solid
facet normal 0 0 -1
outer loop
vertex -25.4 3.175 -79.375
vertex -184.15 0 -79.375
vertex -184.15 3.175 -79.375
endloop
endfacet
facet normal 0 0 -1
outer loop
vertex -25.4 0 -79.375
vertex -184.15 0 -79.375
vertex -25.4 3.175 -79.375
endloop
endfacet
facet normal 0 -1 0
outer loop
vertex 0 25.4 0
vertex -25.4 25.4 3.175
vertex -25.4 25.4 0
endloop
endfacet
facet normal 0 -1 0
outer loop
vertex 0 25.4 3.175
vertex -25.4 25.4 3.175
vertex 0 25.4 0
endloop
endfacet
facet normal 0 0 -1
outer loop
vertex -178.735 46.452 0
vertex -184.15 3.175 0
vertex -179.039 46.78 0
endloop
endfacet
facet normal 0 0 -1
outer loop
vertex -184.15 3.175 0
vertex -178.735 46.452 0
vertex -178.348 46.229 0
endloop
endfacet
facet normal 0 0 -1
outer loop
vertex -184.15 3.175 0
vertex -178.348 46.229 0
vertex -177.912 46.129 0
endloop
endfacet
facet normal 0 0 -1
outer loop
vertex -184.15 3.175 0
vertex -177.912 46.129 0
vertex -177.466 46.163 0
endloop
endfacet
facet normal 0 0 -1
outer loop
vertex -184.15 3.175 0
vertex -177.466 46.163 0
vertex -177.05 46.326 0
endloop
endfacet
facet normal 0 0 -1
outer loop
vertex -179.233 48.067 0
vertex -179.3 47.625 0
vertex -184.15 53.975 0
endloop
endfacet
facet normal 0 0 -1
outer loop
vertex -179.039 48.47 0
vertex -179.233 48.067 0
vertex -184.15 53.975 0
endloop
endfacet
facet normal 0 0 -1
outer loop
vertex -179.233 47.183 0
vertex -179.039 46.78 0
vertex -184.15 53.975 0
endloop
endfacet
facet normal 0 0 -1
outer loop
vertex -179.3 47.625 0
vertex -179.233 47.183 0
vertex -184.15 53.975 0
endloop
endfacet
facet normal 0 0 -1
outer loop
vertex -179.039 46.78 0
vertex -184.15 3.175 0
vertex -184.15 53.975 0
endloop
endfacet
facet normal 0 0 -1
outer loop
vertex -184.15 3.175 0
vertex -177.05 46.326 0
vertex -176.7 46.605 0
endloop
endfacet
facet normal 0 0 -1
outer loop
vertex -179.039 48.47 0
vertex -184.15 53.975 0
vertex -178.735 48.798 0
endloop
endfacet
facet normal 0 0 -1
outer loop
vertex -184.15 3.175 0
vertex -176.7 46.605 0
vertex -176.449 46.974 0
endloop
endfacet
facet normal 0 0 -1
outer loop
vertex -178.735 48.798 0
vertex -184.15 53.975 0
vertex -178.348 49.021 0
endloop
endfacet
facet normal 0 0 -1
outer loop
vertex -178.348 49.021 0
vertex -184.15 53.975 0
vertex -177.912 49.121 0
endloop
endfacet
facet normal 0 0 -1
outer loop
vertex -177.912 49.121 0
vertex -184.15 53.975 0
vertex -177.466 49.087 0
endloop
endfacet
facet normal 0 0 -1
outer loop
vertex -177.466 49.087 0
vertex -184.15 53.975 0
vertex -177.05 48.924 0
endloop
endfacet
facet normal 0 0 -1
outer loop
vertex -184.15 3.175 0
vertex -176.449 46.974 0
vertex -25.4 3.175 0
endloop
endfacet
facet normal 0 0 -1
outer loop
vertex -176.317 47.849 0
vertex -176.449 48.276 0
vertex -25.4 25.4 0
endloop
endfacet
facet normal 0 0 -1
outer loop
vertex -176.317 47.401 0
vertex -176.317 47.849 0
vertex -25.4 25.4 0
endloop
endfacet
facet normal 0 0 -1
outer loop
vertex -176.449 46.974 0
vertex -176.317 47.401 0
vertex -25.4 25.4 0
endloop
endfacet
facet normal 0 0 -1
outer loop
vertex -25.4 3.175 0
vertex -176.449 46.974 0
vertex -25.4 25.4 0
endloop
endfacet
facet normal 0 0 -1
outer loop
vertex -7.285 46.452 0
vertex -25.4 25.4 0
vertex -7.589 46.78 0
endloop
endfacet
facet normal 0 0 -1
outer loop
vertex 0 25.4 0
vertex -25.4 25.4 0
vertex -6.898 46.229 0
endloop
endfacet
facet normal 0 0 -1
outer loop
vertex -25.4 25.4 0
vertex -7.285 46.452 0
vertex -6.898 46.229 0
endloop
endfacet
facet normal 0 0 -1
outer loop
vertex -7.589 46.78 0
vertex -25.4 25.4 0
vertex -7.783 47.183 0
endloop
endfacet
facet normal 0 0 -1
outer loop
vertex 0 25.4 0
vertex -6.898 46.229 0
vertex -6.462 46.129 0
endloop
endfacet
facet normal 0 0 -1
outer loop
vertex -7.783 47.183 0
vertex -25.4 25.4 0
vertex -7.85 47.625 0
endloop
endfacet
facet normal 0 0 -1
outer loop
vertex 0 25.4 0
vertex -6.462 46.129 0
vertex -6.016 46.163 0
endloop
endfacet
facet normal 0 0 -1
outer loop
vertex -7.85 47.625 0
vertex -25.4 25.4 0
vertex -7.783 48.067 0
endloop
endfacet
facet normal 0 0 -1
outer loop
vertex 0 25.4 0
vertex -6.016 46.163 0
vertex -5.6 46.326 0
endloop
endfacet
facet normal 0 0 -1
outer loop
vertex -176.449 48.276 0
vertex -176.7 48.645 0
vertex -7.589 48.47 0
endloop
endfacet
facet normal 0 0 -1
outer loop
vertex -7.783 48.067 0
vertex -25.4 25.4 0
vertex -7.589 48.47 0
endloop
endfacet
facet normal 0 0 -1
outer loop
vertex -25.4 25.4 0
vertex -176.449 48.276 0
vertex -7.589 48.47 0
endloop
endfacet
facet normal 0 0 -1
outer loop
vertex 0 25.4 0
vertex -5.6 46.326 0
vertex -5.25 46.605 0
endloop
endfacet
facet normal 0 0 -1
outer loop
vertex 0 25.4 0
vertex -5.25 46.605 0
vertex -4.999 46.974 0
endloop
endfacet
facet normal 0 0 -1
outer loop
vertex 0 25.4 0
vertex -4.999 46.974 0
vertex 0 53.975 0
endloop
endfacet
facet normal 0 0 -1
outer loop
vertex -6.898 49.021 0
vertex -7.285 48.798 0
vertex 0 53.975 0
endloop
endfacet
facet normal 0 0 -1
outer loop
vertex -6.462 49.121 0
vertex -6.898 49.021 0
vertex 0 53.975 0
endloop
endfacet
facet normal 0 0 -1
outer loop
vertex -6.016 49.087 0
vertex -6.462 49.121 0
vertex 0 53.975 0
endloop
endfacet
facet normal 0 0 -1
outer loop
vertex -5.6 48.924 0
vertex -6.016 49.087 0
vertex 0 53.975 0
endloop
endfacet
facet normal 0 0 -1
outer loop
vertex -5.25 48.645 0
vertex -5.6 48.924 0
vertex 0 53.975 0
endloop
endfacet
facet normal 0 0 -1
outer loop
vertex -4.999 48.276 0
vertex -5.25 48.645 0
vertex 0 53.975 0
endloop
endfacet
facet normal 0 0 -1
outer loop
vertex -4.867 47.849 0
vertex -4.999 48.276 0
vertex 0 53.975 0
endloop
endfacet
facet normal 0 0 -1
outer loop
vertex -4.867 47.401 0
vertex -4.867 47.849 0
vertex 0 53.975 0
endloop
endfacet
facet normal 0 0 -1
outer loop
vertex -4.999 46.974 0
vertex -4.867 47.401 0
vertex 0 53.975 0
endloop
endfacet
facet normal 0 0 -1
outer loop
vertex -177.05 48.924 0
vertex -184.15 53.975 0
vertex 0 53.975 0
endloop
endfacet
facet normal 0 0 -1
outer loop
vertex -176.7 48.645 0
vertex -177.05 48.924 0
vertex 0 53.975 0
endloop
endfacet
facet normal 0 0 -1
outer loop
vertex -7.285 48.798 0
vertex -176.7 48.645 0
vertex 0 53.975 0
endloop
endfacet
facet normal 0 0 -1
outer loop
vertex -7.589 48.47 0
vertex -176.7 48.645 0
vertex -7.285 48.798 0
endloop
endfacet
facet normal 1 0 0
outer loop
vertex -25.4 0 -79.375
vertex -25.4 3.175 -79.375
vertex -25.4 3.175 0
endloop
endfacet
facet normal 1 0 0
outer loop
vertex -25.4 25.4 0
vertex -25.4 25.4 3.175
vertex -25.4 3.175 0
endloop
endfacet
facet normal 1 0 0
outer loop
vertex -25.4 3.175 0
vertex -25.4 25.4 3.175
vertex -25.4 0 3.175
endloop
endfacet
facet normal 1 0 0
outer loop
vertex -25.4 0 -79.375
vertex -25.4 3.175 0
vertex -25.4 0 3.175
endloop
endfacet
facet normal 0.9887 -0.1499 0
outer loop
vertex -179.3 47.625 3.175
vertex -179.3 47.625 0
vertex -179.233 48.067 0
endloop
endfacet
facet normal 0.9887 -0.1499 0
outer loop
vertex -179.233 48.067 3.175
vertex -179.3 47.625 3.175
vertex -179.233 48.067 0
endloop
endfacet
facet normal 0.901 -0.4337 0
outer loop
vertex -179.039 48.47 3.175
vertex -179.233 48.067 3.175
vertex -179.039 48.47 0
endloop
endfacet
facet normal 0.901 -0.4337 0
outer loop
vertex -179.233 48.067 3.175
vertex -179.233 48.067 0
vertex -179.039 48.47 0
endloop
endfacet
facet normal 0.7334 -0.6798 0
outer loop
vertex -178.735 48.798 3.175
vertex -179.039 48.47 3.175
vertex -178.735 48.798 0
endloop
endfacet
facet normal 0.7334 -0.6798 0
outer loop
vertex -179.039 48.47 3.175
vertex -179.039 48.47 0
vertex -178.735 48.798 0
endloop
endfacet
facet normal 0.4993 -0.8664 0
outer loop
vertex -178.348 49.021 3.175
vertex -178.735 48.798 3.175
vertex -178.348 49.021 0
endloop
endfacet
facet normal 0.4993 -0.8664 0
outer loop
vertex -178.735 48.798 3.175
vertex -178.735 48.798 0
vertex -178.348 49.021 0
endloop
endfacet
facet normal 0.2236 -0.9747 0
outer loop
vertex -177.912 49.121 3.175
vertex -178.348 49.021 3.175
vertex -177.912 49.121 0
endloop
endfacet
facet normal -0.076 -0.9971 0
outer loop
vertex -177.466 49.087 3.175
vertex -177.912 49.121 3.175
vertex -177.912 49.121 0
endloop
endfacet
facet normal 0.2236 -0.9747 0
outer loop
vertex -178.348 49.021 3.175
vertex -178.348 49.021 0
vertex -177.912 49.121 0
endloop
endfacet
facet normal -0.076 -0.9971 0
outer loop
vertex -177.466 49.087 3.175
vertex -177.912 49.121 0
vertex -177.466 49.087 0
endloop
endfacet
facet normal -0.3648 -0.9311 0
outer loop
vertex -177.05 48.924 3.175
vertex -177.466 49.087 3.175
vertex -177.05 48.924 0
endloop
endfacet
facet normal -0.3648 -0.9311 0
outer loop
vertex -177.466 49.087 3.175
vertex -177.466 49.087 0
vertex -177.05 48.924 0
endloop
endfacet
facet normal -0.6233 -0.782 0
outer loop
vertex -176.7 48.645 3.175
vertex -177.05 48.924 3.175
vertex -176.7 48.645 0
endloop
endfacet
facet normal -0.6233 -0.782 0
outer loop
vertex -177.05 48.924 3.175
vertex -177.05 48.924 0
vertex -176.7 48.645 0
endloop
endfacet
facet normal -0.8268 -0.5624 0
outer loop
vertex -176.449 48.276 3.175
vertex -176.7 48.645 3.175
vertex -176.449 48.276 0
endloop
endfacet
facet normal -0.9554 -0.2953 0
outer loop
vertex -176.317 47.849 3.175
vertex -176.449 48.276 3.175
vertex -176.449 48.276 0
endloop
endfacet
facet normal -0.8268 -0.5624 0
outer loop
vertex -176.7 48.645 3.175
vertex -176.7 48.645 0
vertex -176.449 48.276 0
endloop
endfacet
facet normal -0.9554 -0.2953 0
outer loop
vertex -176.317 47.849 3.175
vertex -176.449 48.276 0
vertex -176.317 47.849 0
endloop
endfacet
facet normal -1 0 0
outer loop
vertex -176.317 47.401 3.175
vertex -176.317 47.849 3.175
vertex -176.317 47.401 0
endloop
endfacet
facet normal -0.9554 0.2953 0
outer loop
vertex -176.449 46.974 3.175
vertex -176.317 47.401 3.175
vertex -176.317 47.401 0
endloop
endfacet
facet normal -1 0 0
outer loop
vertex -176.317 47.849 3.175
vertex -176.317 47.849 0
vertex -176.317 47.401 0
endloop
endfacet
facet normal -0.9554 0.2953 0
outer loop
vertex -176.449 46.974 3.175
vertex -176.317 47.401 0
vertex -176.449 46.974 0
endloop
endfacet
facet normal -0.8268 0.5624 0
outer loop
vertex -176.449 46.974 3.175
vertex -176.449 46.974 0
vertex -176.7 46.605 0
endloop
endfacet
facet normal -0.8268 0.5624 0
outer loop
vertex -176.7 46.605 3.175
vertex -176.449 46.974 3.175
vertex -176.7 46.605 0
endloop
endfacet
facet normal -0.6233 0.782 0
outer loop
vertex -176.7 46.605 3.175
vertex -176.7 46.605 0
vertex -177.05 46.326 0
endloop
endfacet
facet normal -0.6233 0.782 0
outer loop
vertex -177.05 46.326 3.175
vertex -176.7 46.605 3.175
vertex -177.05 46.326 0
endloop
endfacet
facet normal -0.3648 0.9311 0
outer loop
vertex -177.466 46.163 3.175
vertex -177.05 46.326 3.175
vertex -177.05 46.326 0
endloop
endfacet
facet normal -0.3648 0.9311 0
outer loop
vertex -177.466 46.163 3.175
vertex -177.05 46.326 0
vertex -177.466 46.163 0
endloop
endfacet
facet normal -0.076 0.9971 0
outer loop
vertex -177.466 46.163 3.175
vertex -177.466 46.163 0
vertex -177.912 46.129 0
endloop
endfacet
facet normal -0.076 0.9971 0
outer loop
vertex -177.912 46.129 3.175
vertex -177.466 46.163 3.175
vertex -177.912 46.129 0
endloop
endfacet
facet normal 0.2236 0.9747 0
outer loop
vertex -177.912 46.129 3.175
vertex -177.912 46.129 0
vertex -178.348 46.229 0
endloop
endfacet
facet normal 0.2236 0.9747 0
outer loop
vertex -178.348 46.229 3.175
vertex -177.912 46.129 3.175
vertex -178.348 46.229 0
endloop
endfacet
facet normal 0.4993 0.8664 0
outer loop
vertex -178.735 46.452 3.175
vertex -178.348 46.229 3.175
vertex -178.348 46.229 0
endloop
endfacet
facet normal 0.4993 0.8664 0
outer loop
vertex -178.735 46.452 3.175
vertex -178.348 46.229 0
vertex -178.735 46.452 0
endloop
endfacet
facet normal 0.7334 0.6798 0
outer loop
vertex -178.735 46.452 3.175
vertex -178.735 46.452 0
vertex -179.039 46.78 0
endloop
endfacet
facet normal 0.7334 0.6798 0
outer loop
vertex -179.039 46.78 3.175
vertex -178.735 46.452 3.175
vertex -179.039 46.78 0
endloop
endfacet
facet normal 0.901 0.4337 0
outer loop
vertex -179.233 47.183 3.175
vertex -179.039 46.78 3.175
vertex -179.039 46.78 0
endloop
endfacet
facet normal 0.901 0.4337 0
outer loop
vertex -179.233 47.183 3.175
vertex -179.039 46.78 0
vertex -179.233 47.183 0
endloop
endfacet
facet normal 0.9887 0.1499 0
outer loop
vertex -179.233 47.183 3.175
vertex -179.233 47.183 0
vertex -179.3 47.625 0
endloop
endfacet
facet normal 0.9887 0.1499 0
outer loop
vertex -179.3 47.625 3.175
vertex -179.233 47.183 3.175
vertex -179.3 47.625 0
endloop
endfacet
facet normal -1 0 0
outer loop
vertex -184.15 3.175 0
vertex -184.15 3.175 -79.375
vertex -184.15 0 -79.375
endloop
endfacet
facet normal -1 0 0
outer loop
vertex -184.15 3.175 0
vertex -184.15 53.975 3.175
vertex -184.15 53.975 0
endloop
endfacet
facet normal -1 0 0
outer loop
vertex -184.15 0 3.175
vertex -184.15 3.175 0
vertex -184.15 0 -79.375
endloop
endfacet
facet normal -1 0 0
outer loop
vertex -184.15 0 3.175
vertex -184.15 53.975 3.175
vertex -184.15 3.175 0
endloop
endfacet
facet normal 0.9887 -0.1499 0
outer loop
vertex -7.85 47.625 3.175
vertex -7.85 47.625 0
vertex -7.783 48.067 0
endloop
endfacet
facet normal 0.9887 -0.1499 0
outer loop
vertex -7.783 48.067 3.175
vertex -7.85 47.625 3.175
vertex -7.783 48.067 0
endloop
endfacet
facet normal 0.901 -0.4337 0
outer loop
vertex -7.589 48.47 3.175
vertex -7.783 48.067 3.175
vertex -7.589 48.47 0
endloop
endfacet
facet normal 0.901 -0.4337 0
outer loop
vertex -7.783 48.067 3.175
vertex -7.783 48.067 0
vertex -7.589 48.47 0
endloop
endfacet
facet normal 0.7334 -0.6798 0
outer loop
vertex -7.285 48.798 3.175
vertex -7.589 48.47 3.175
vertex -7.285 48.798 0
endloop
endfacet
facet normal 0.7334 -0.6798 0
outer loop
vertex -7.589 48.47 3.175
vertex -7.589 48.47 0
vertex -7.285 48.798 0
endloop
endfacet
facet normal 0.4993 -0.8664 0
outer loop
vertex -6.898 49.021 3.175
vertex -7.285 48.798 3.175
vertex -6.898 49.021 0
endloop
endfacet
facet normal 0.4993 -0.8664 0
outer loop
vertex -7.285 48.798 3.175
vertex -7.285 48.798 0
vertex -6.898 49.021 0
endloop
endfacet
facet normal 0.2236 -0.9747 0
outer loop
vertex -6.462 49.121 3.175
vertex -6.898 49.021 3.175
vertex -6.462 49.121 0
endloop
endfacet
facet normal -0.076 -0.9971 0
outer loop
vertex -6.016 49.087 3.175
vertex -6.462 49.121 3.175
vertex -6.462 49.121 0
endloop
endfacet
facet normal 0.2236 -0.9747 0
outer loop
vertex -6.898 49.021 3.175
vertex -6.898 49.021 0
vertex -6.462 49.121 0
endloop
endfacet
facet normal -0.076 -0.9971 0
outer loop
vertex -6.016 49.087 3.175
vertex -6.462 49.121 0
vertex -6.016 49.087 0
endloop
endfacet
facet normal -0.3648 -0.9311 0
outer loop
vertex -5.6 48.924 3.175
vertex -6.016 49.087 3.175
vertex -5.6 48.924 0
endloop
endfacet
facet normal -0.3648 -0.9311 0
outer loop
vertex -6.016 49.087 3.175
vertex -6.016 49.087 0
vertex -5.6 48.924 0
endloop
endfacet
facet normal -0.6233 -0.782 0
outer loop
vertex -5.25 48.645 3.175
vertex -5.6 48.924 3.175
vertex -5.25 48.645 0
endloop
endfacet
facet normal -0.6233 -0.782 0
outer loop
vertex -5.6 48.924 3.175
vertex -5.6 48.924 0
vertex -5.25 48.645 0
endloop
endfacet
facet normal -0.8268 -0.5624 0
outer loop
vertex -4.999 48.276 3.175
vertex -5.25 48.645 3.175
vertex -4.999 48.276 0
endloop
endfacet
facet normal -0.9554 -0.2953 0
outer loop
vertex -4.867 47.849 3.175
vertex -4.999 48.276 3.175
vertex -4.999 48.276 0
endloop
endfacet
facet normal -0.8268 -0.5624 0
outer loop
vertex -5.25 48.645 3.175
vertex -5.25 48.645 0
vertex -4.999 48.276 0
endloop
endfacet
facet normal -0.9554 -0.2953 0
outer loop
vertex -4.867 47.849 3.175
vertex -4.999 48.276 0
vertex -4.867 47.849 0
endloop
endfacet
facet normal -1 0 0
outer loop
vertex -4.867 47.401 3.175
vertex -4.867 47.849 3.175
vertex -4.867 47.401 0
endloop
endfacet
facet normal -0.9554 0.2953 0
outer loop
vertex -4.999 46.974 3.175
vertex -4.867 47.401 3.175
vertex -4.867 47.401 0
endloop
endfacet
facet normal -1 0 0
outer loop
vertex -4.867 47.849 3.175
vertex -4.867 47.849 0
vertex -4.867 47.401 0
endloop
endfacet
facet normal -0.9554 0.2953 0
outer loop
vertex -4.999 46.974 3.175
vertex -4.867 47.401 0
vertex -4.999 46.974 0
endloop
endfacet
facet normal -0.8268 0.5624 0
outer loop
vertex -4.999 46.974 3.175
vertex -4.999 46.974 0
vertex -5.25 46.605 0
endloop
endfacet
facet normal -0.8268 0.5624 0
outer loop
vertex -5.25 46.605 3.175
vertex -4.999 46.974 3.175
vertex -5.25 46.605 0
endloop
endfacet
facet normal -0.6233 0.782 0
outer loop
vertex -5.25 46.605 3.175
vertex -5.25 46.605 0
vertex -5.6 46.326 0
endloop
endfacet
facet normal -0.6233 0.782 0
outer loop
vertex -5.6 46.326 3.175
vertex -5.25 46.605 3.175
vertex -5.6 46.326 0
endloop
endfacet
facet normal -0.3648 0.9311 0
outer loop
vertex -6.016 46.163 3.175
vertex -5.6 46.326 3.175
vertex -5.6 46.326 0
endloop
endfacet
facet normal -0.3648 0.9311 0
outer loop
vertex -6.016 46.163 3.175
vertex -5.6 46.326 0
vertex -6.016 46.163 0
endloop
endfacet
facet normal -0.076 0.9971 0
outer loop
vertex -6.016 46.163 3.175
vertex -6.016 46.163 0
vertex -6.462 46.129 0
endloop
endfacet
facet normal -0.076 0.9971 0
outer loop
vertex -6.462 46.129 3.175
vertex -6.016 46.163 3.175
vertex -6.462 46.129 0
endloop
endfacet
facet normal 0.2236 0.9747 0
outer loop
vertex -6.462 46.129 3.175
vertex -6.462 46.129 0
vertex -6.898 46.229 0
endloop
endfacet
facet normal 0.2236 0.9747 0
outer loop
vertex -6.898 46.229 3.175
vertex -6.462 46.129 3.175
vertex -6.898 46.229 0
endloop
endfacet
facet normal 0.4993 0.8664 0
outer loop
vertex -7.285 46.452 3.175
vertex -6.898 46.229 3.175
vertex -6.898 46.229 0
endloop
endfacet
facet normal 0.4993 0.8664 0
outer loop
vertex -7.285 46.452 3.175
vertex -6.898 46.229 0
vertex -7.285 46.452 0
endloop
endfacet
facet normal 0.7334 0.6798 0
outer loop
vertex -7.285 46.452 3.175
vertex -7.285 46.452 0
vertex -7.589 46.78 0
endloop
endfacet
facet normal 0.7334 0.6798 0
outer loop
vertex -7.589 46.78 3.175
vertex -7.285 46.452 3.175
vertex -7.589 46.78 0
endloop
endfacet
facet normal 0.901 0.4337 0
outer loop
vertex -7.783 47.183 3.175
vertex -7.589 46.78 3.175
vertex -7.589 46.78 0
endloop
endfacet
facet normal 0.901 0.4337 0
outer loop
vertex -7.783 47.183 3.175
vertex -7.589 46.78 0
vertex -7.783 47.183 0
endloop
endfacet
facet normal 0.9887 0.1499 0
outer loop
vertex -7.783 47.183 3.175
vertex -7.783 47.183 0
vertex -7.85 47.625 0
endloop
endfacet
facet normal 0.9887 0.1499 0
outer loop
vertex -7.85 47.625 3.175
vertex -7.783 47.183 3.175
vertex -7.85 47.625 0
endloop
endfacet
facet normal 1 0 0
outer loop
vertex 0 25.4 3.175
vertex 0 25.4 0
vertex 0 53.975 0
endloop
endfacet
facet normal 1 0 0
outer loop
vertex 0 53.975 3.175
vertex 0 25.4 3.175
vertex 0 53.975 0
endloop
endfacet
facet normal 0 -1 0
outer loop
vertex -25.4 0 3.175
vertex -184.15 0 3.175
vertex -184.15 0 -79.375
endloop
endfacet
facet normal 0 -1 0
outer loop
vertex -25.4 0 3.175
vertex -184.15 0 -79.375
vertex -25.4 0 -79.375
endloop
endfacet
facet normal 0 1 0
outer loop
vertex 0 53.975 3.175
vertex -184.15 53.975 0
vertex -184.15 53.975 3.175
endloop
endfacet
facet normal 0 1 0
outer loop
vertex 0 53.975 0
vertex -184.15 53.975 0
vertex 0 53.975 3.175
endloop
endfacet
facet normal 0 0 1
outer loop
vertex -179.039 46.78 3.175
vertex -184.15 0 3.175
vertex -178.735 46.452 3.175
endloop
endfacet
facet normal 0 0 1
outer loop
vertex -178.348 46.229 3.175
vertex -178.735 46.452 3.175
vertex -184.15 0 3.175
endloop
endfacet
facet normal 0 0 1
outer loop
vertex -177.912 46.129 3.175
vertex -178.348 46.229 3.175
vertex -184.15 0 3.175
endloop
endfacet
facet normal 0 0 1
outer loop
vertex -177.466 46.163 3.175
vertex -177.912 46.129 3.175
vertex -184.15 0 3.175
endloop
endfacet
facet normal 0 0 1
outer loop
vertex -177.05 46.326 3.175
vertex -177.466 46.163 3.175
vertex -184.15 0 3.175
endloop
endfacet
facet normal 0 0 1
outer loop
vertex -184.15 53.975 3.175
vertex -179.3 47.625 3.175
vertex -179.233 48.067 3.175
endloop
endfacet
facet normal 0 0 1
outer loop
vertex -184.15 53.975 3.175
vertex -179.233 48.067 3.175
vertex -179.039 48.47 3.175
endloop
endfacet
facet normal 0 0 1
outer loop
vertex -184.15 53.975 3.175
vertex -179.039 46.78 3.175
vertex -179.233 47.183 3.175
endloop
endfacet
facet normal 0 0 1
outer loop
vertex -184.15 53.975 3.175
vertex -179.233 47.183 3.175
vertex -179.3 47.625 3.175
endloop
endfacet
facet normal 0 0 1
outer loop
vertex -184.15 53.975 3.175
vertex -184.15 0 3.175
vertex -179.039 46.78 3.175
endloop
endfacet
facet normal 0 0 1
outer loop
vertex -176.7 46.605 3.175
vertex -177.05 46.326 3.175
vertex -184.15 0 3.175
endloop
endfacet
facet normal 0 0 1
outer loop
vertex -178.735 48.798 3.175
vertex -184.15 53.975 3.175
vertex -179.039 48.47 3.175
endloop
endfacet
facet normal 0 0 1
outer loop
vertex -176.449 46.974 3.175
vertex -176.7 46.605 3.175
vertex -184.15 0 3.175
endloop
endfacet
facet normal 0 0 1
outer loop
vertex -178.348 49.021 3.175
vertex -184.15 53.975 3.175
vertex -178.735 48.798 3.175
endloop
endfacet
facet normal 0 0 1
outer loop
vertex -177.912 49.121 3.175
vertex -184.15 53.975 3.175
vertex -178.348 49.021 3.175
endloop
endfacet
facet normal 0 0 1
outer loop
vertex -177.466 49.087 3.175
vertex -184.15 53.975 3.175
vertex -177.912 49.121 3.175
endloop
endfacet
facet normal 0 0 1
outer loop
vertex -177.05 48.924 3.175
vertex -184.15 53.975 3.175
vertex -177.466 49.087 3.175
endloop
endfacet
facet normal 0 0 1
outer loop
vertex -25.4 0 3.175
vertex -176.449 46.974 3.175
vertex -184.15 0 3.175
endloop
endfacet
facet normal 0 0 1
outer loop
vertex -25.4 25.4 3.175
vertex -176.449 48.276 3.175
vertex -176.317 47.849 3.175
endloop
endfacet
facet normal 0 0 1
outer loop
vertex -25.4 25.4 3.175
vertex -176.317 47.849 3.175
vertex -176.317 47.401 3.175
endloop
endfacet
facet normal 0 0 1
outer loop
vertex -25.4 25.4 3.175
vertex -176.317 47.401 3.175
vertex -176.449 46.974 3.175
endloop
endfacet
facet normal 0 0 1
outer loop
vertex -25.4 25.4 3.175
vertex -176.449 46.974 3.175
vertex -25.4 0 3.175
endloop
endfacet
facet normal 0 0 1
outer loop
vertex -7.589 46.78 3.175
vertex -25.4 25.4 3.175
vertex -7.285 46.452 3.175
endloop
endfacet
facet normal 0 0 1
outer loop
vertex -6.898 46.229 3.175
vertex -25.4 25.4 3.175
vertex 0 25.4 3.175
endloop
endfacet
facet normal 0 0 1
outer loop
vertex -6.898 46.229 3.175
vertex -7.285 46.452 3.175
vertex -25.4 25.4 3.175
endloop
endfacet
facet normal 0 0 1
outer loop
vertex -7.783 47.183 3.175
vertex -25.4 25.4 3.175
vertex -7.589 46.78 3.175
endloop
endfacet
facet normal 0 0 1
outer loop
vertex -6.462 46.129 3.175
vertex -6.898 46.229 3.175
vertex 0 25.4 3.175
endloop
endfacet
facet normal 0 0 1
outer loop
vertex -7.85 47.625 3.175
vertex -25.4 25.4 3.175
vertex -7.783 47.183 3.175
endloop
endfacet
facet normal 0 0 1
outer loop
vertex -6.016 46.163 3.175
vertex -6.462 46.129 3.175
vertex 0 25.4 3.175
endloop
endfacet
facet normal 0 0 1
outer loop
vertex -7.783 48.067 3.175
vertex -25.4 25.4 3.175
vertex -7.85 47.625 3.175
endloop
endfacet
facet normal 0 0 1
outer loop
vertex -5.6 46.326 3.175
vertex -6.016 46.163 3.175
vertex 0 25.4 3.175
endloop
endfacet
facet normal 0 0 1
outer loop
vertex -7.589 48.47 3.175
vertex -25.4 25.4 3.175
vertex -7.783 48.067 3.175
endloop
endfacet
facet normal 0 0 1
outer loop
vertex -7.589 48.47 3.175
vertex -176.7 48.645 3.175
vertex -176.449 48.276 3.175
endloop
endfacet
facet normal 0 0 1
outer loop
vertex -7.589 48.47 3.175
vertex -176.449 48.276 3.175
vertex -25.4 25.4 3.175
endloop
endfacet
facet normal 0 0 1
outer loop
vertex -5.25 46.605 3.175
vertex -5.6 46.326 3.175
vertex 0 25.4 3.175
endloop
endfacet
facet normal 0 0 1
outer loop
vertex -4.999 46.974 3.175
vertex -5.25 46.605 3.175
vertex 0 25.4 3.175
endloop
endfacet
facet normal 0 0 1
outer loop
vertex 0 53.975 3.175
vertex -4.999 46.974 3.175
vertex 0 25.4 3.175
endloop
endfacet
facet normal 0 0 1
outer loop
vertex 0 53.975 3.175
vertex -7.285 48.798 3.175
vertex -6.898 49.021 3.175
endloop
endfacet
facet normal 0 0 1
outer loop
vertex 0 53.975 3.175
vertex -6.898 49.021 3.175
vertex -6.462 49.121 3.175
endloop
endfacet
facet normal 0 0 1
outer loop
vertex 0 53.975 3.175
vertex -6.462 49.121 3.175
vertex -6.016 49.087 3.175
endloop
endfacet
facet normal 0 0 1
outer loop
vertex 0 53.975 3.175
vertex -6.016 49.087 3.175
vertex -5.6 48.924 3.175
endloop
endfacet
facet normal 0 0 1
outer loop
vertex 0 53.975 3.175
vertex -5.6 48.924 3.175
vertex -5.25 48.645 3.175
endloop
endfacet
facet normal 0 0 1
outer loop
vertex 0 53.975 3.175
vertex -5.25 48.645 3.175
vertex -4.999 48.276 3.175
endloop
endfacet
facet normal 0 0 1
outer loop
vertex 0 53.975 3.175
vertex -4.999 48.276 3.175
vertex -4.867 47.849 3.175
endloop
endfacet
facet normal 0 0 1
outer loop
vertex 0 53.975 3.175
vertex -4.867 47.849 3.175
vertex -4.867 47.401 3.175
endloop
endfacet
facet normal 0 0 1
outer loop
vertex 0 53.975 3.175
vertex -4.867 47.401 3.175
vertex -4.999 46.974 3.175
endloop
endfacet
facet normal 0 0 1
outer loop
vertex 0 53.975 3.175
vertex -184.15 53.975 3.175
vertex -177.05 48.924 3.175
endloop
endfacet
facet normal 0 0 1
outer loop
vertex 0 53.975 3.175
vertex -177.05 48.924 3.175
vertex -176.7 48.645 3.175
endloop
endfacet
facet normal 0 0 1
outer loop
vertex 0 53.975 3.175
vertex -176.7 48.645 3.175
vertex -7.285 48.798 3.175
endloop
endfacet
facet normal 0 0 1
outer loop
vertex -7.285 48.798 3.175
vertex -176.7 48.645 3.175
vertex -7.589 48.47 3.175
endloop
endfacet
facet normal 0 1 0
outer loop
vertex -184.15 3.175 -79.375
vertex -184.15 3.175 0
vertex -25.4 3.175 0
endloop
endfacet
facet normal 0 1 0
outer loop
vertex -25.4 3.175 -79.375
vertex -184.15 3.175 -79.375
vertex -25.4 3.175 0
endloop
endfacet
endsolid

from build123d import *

# Parameters (mm, degrees)
F0_W     = 184.15
F0_H     = 53.975
F1_DEPTH = 3.175
F3_D     = 3
F4_W     = 25.4
F4_H     = 25.4
F5_DEPTH = 25.4
F6_W     = 158.75
F6_H     = 3.175
F7_DEPTH = 79.375


with BuildPart() as f1:
    # F0 (on Top) → F1 (new body)
    with BuildSketch(Plane.XY):
        with Locations((-92.075, 26.9875)):
            Rectangle(F0_W, F0_H)
    extrude(amount=F1_DEPTH)

    # F3 (through all)
    with Locations(Plane.XY.offset(3.175)):
        with Locations((-177.8, 47.625), (-6.35, 47.625)):
            Hole(F3_D / 2)

    # F4 (on face) → F5 (cut)
    with BuildSketch(Plane.XY.offset(3.175)):
        with Locations((-12.7, 12.7)):
            Rectangle(F4_W, F4_H)
    extrude(amount=-F5_DEPTH, mode=Mode.SUBTRACT)

    # F6 (on face) → F7 (join)
    with BuildSketch(Plane(origin=(0, 0, 0), x_dir=(1, 0, 0), z_dir=(0, 0, -1))):
        with Locations((-104.775, -1.5875)):
            Rectangle(F6_W, F6_H)
    extrude(amount=F7_DEPTH)


solid = f1.part
